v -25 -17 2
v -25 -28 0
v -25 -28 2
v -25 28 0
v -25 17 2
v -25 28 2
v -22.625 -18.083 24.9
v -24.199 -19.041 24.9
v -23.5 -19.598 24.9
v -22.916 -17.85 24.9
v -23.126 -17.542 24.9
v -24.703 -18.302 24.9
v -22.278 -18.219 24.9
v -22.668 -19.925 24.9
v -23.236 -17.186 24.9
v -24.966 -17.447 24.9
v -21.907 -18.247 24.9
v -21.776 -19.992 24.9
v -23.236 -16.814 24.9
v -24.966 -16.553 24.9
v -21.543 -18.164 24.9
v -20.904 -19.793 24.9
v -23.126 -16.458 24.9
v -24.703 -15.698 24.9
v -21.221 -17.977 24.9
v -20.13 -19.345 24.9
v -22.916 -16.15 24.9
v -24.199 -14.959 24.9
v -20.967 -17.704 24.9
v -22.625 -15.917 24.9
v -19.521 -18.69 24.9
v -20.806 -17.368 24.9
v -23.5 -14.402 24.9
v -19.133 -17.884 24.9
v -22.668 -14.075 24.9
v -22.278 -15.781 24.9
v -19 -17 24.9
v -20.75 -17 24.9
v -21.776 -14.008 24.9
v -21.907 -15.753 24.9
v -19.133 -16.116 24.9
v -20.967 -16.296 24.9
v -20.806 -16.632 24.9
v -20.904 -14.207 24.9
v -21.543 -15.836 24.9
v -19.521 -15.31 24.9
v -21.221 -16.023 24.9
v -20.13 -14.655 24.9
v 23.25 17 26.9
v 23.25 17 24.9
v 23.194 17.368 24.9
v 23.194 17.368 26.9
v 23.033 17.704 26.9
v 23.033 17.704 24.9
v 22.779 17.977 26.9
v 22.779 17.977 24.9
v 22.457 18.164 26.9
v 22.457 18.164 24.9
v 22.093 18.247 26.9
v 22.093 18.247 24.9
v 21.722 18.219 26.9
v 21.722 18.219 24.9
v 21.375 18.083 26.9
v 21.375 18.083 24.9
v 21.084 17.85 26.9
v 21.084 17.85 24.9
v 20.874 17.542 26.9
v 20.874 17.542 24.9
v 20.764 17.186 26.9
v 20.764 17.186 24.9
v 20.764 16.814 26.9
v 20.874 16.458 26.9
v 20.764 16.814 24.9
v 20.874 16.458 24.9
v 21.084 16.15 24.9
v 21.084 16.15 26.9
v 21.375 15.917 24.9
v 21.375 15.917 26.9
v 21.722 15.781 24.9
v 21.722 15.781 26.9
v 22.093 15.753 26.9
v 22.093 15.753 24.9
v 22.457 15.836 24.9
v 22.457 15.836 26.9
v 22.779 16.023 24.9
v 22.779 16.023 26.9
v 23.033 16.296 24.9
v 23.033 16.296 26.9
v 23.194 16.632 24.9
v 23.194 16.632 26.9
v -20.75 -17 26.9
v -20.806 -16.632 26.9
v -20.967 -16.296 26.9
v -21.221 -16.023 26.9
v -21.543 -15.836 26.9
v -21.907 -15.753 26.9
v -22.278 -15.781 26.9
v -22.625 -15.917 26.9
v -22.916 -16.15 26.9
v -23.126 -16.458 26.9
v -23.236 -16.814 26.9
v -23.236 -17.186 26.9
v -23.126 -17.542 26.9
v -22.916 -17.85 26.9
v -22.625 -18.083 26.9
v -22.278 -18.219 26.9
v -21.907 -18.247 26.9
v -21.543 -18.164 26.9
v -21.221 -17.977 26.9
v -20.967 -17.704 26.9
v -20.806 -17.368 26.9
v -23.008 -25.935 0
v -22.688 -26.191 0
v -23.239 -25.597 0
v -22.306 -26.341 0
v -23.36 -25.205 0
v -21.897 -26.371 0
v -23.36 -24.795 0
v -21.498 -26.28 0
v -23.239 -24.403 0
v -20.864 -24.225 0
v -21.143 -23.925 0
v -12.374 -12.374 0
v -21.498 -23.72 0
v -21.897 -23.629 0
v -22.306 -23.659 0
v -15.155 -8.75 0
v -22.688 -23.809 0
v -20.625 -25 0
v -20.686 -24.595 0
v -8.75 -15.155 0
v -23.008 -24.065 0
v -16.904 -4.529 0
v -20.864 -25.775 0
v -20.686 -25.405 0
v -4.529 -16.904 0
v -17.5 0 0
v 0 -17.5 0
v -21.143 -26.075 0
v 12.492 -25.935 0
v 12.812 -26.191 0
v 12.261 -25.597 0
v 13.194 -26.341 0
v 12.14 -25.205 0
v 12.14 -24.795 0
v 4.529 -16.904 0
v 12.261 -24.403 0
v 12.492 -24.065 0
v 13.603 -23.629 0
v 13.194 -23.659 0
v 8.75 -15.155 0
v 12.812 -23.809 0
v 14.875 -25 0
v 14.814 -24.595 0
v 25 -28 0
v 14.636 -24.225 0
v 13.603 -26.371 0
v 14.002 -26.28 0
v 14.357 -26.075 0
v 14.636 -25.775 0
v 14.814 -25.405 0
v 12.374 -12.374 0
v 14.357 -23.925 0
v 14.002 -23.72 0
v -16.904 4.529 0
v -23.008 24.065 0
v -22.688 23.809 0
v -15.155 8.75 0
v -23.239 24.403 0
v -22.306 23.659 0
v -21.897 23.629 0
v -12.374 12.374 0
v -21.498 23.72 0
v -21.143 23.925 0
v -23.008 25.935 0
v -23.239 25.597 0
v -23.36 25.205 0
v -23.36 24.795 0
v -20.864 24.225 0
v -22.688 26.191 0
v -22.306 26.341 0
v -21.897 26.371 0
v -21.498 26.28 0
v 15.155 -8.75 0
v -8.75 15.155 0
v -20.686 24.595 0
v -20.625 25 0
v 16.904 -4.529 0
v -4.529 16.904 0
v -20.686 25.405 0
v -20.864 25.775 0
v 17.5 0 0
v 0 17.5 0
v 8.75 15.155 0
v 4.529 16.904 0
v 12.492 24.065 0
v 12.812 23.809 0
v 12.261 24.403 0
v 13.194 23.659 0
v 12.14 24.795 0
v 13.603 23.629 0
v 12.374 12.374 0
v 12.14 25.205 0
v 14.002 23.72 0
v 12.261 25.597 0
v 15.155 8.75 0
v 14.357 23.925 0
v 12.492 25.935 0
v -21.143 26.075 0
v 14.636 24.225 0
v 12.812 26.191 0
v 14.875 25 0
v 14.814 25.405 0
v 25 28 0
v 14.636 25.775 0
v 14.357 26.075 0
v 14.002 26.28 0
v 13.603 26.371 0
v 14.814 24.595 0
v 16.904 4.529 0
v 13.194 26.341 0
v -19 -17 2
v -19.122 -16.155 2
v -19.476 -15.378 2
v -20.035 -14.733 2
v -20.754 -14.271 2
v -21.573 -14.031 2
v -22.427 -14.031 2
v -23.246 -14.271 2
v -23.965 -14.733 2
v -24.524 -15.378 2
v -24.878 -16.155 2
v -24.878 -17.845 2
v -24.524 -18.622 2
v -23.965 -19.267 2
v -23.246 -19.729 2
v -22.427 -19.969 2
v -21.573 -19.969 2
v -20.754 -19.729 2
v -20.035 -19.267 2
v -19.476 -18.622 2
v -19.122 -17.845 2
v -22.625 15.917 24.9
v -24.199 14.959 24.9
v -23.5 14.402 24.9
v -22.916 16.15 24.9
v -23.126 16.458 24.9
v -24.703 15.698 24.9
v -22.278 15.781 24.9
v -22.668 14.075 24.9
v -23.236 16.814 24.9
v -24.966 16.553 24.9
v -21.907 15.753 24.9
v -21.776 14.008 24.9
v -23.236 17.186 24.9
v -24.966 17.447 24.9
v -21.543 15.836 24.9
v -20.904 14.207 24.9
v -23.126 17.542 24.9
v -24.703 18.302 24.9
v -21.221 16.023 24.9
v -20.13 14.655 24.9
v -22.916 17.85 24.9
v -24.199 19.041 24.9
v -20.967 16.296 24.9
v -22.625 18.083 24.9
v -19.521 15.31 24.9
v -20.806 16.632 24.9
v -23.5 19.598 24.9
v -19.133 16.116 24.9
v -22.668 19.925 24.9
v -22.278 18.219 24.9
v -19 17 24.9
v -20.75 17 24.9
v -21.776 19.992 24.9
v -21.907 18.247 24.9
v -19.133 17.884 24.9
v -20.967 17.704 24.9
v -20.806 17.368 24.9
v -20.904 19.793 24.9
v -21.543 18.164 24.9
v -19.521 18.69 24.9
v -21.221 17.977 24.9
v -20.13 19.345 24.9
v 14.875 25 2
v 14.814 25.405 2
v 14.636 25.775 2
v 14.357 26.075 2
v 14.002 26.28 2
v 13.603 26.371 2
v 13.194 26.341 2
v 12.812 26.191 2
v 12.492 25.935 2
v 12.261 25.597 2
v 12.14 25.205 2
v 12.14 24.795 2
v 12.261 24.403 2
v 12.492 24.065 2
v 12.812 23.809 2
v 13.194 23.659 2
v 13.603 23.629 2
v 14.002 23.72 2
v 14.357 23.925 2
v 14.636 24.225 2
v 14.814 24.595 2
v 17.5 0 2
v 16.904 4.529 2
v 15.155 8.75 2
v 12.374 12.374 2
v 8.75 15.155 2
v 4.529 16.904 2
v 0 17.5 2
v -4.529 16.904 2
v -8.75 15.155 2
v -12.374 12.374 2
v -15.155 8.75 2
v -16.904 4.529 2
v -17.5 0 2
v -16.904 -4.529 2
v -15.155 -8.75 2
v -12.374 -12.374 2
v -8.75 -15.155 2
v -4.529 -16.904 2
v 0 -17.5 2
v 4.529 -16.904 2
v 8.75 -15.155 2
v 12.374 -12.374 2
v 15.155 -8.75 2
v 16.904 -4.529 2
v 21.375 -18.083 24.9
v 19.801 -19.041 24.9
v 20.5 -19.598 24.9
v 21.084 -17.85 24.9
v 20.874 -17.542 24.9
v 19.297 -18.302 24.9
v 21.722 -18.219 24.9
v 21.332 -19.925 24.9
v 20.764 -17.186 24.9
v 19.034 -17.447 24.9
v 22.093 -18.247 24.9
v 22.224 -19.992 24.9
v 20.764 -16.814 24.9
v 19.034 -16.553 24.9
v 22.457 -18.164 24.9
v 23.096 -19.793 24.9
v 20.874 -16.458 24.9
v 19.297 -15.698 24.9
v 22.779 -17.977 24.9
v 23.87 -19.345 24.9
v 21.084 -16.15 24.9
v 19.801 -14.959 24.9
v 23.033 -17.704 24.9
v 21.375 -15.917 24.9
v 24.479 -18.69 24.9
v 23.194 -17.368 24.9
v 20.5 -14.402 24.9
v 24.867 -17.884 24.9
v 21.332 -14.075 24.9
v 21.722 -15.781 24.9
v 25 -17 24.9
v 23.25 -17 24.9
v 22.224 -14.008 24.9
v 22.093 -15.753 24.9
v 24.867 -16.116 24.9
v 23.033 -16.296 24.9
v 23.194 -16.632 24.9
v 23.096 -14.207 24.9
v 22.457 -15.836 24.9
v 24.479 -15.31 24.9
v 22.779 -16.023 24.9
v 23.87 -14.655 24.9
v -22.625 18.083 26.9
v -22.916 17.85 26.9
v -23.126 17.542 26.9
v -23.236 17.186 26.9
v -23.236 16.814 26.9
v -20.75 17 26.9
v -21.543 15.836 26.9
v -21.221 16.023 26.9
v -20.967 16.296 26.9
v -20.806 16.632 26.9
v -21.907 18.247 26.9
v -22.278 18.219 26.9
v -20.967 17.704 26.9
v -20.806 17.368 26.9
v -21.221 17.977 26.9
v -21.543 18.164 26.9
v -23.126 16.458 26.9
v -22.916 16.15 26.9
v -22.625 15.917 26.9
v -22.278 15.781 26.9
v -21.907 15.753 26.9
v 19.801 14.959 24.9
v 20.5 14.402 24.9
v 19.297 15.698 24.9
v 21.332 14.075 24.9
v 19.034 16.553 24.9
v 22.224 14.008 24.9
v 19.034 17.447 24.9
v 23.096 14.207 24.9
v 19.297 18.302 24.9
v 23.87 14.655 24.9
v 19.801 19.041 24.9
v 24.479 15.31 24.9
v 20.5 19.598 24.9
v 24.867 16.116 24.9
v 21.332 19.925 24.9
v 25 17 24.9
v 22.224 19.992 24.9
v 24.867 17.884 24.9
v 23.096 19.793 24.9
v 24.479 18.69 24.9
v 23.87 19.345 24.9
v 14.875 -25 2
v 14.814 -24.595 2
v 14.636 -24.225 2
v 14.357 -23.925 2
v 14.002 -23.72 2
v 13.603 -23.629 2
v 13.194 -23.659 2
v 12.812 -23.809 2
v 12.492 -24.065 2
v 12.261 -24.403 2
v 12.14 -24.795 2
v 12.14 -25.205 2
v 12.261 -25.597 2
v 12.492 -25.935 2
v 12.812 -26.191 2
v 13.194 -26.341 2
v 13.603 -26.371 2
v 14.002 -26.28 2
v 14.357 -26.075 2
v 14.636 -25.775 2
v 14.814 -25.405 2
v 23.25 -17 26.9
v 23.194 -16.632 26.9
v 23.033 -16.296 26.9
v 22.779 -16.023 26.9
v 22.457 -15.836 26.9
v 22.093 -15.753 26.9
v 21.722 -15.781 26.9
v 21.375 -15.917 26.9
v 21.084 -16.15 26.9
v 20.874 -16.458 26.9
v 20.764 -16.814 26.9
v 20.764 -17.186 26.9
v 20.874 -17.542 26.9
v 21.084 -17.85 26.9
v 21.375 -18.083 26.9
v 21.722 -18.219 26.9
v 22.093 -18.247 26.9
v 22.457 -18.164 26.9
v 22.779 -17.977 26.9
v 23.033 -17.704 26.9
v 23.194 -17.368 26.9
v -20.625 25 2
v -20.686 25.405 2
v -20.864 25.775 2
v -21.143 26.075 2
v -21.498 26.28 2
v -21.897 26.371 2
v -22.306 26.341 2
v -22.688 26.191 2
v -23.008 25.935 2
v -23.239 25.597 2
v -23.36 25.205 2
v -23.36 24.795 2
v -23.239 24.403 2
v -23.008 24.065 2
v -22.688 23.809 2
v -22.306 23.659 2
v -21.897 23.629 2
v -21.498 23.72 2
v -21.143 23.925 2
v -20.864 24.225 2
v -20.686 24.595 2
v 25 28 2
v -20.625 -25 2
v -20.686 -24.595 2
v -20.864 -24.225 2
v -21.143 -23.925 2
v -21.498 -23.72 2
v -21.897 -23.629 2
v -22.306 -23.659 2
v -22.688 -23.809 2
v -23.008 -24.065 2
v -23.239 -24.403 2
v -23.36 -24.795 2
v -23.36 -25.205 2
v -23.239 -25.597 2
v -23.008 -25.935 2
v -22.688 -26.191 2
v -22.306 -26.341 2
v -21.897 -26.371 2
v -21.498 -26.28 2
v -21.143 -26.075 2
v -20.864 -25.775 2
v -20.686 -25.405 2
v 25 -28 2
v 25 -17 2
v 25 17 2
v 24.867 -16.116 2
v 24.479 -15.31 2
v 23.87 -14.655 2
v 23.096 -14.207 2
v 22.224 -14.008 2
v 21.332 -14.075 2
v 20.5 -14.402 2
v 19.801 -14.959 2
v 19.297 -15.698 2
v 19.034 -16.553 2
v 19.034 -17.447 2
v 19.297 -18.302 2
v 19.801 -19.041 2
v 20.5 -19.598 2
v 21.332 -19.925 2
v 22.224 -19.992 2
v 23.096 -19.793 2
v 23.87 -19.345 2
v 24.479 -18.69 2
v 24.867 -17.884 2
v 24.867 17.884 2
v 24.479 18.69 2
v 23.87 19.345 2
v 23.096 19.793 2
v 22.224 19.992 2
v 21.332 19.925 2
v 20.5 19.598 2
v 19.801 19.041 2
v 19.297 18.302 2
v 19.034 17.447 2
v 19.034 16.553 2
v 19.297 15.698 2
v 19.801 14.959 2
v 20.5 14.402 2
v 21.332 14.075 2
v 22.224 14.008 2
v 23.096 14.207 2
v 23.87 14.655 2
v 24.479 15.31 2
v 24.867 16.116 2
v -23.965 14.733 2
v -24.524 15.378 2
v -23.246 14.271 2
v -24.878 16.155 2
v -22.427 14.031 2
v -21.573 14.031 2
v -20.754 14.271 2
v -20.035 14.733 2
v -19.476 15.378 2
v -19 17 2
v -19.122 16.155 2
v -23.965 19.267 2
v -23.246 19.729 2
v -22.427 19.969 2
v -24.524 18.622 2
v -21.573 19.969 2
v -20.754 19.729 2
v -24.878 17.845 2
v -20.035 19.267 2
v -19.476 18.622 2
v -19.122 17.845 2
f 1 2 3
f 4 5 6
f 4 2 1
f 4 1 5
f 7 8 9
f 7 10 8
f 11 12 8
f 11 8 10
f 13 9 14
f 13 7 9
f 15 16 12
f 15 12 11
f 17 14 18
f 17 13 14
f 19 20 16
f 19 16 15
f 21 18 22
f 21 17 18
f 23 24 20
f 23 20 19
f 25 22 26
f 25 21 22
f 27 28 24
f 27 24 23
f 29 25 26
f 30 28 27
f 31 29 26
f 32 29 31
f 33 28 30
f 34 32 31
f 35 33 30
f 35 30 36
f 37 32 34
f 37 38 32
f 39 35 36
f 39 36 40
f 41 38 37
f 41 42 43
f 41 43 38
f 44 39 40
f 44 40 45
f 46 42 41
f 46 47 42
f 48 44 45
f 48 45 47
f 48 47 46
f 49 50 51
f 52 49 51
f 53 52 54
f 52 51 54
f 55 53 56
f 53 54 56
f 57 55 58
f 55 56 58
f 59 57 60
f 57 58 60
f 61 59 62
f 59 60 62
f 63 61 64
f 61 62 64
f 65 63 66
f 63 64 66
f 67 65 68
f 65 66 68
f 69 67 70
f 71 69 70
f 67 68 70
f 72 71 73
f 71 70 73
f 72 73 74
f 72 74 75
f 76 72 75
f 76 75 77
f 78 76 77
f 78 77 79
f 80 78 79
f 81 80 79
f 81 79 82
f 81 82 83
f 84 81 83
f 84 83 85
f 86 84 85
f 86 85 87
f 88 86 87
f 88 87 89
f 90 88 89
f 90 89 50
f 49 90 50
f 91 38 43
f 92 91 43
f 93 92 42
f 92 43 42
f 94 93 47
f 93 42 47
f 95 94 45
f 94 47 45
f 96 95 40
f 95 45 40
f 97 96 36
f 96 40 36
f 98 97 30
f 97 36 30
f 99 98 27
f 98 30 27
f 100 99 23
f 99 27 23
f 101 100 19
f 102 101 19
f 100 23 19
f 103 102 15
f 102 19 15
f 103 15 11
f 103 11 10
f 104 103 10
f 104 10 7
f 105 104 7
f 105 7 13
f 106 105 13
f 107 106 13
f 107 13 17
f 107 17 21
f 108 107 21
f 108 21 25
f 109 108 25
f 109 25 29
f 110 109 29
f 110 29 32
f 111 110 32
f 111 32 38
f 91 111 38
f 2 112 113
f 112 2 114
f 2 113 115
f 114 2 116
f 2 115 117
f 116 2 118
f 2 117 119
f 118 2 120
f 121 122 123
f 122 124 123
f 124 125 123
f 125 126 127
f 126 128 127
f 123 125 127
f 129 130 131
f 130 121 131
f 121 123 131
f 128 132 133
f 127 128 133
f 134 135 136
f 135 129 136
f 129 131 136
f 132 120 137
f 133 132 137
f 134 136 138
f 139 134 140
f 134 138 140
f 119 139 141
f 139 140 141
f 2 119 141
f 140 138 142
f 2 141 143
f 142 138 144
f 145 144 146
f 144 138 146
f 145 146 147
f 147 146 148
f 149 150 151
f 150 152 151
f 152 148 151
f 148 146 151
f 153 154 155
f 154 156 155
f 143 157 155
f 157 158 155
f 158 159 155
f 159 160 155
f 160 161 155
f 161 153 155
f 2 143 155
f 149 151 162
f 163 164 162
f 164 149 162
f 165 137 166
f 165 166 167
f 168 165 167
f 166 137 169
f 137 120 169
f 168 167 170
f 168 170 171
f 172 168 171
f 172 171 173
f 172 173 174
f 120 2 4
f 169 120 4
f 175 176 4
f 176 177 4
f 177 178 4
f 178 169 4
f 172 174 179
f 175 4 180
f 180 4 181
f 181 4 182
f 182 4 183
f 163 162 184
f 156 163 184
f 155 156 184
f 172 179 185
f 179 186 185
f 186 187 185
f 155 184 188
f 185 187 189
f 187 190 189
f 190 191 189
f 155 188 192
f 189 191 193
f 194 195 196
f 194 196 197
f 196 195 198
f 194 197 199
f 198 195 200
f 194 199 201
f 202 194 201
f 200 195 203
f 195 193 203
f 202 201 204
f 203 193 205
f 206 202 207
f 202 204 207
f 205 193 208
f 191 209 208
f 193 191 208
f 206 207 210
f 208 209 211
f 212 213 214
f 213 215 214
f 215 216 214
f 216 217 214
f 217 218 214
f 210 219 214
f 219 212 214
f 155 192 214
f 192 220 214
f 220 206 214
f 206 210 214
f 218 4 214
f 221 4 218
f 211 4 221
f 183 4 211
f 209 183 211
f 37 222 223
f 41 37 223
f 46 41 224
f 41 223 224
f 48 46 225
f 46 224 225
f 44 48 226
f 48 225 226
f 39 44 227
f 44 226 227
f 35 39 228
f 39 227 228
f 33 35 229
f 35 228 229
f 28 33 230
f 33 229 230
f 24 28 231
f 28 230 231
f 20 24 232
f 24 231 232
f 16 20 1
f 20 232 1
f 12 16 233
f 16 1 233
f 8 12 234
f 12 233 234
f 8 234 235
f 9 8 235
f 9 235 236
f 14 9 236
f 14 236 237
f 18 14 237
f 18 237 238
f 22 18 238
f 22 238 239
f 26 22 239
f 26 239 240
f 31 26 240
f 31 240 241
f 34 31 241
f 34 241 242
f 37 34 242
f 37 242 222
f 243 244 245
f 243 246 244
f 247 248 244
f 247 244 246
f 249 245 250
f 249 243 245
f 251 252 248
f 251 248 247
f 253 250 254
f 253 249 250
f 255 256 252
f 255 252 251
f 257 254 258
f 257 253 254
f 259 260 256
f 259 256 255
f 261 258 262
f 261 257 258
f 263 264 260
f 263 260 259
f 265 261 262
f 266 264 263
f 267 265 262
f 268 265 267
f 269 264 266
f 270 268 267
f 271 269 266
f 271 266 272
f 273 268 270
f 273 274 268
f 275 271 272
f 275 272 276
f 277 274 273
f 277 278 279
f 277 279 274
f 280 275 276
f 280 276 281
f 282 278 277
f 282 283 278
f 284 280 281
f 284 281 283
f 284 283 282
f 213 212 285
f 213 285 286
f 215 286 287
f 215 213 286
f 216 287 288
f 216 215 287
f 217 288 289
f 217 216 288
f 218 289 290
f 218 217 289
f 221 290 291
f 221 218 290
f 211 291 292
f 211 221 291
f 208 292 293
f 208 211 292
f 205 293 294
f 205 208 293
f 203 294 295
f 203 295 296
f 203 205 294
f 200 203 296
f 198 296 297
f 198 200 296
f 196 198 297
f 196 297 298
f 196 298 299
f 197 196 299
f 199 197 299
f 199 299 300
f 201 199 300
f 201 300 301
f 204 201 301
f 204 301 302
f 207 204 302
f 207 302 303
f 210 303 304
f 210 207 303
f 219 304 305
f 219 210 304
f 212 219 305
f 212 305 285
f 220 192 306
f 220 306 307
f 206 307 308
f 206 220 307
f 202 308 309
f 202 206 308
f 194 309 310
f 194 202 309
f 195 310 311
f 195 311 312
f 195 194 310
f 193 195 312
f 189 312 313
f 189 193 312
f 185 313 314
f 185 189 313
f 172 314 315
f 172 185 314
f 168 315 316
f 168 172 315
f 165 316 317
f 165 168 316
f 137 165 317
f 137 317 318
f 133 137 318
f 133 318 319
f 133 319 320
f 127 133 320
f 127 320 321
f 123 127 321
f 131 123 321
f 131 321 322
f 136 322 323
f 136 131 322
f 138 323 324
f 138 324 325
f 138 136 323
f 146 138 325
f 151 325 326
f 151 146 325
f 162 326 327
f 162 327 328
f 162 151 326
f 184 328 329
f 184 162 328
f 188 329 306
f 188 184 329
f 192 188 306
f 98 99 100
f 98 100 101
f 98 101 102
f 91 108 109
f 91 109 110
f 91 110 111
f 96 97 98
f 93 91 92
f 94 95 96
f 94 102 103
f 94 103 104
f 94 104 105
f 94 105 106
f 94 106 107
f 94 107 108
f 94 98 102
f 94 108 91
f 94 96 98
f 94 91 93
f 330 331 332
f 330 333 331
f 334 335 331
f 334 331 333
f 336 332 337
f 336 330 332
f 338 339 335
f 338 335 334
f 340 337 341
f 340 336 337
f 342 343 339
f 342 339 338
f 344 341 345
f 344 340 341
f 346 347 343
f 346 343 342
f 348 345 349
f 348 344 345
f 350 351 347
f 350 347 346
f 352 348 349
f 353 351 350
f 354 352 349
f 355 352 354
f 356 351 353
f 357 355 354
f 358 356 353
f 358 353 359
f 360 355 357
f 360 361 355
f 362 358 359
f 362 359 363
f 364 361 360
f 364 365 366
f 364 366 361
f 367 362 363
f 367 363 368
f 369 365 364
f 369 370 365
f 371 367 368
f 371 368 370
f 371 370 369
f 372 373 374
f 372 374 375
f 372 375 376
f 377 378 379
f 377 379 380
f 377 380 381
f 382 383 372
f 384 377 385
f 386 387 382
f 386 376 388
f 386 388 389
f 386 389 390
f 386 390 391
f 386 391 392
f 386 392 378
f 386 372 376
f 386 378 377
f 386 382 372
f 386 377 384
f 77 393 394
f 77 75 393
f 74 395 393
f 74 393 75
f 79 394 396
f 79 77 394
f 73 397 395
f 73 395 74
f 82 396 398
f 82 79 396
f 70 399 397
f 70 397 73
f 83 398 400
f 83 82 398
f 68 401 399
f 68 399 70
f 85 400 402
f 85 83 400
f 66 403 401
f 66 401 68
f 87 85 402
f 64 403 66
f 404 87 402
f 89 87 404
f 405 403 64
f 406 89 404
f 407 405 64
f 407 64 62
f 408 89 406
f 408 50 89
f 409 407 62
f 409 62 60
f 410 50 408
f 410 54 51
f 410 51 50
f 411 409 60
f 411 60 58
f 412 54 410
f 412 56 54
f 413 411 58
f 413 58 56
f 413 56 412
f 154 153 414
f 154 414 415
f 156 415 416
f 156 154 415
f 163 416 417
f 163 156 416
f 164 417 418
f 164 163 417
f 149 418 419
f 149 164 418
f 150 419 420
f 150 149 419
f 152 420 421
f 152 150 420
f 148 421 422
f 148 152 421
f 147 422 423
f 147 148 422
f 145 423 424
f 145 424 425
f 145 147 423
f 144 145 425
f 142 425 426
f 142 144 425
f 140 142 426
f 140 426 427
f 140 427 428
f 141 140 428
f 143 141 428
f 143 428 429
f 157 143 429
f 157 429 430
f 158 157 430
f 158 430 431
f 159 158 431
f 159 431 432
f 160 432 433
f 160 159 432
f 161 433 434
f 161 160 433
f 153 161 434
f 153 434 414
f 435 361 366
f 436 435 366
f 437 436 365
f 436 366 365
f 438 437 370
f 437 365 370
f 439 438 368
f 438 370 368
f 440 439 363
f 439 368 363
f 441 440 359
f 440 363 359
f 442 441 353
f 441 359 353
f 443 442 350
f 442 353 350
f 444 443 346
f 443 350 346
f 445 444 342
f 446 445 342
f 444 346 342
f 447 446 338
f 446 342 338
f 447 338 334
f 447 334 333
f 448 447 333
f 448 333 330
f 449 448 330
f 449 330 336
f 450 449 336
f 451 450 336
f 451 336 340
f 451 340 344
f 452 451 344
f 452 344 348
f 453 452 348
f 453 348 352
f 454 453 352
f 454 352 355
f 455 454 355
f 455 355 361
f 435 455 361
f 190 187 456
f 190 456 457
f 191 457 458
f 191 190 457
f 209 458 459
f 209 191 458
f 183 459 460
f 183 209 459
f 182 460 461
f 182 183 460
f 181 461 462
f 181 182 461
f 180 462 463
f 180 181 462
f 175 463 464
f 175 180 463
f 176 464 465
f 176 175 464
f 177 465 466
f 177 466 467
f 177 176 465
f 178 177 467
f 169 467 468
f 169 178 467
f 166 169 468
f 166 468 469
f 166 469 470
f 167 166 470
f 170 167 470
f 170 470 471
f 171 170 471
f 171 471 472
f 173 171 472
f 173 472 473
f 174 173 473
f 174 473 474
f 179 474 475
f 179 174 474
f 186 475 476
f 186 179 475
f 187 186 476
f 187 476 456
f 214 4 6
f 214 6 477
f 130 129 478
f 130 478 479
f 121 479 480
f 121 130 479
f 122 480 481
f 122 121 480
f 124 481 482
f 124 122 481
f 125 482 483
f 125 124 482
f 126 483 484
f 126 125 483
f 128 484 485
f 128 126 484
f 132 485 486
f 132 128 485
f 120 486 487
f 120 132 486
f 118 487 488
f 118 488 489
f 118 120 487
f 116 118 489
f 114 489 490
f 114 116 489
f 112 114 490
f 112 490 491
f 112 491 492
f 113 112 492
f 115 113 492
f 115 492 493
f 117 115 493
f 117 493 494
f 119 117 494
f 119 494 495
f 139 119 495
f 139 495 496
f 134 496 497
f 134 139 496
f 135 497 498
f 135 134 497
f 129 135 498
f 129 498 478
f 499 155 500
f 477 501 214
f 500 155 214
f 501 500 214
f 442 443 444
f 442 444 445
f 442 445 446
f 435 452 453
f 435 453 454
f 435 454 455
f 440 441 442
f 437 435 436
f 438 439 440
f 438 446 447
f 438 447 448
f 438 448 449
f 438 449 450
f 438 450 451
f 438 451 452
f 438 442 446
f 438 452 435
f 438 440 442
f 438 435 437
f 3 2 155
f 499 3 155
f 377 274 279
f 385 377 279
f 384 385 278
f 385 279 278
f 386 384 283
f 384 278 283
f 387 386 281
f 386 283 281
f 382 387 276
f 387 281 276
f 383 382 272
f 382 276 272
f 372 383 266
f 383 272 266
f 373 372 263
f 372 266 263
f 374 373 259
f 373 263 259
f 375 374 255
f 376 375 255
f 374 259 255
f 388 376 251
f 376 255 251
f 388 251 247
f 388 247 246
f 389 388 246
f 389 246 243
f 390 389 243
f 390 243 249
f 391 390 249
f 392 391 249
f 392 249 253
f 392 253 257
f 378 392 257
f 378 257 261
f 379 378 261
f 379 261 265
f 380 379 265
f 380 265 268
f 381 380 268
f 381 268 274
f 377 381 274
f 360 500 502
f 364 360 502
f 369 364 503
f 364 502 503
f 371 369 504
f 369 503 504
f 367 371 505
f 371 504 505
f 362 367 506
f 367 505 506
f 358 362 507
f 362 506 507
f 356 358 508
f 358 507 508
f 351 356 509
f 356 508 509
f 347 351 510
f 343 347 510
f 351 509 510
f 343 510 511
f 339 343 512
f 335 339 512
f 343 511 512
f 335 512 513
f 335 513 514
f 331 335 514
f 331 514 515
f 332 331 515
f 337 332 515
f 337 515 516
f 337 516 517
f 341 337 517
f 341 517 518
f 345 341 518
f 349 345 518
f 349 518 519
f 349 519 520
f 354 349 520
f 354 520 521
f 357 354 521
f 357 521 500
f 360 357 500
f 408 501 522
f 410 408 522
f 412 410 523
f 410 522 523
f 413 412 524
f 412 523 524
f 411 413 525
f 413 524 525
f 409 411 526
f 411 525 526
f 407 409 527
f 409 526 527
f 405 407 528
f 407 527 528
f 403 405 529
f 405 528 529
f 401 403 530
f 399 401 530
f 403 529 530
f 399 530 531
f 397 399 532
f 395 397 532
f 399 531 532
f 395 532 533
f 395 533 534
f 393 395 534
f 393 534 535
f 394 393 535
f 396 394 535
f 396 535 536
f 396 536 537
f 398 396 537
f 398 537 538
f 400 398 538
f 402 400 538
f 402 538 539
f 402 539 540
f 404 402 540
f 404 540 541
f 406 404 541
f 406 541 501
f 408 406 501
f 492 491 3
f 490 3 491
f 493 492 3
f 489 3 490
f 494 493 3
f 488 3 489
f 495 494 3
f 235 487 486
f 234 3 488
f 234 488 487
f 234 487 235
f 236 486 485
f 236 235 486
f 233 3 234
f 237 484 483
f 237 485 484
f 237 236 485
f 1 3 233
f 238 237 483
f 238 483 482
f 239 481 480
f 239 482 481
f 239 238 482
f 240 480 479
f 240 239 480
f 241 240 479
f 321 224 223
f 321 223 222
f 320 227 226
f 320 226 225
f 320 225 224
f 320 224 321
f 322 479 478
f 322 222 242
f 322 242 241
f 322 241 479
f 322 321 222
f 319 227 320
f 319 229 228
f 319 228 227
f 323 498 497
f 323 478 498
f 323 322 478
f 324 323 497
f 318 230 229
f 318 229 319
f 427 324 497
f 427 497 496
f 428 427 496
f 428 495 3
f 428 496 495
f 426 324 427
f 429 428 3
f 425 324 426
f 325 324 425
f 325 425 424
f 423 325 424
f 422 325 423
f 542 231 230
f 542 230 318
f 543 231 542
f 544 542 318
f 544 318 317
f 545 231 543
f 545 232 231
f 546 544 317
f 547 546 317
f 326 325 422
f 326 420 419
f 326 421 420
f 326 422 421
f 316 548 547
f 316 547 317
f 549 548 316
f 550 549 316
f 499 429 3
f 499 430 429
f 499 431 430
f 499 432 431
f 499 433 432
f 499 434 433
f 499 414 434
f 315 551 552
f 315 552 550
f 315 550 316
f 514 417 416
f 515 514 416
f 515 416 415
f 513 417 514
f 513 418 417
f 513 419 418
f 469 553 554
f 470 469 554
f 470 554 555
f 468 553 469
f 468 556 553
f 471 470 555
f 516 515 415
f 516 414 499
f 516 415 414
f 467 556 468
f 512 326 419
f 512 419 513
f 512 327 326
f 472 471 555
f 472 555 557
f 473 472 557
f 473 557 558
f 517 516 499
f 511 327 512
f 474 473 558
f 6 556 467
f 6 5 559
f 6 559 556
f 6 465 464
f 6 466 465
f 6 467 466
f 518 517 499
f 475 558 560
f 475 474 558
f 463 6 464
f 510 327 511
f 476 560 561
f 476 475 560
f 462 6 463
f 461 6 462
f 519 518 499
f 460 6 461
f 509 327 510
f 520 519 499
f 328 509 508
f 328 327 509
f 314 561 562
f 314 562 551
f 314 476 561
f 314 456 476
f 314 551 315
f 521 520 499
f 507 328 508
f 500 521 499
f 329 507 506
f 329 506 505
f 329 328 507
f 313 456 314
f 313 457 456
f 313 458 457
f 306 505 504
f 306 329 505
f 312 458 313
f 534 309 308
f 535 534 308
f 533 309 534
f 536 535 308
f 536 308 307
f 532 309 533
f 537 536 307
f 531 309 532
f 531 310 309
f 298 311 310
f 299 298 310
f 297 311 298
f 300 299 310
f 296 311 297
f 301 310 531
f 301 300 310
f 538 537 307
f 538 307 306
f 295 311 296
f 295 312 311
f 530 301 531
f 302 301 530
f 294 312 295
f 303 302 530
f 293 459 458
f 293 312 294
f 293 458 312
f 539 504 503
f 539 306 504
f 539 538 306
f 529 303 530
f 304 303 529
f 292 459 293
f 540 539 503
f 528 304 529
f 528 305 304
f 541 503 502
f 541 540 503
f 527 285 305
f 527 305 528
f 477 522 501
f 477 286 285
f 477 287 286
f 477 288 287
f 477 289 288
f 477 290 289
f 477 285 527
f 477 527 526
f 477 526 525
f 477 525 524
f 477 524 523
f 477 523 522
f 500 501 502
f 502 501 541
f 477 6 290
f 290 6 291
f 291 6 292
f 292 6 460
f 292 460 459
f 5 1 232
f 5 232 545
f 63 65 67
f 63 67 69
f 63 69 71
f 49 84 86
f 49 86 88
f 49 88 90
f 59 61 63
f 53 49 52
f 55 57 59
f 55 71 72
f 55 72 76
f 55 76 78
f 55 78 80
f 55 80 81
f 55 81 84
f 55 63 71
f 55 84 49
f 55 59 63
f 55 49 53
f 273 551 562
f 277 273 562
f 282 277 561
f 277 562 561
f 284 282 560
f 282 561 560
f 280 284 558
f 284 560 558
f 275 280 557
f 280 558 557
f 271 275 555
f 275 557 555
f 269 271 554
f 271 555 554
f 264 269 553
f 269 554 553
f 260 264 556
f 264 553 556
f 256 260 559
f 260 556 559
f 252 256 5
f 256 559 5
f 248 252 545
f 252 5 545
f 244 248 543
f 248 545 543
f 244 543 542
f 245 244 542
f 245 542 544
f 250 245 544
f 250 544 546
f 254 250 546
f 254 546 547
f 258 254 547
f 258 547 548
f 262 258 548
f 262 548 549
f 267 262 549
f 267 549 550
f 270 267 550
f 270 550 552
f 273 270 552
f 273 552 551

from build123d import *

# Parameters (mm, degrees)
SKETCH_W     = 50
SKETCH_H     = 56
SKETCH_R     = 1.375
SKETCH_R_2   = 17.5
PAD_DEPTH    = 2
SKETCH001_R  = 3
PAD001_DEPTH = 24.9
SKETCH002_R  = 1.25
PAD002_DEPTH = 26.9


with BuildPart() as part:
    # Sketch → Pad (new body)
    with BuildSketch(Plane.XY):
        Rectangle(SKETCH_W, SKETCH_H)
        with Locations((-22, 25)):
            Circle(SKETCH_R, mode=Mode.SUBTRACT)
        with Locations((13.5, 25)):
            Circle(SKETCH_R, mode=Mode.SUBTRACT)
        with Locations((-22, -25)):
            Circle(SKETCH_R, mode=Mode.SUBTRACT)
        with Locations((13.5, -25)):
            Circle(SKETCH_R, mode=Mode.SUBTRACT)
        Circle(SKETCH_R_2, mode=Mode.SUBTRACT)
    extrude(amount=PAD_DEPTH)

    # Sketch001 → Pad001 (join)
    with BuildSketch(Plane.XY):
        with Locations((-22, 17)):
            Circle(SKETCH001_R)
        with Locations((22, 17)):
            Circle(SKETCH001_R)
        with Locations((22, -17)):
            Circle(SKETCH001_R)
        with Locations((-22, -17)):
            Circle(SKETCH001_R)
    extrude(amount=PAD001_DEPTH)

    # Sketch002 → Pad002 (join)
    with BuildSketch(Plane.XY):
        with Locations((-22, 17)):
            Circle(SKETCH002_R)
        with Locations((22, 17)):
            Circle(SKETCH002_R)
        with Locations((22, -17)):
            Circle(SKETCH002_R)
        with Locations((-22, -17)):
            Circle(SKETCH002_R)
    extrude(amount=PAD002_DEPTH)


solid = part.part
